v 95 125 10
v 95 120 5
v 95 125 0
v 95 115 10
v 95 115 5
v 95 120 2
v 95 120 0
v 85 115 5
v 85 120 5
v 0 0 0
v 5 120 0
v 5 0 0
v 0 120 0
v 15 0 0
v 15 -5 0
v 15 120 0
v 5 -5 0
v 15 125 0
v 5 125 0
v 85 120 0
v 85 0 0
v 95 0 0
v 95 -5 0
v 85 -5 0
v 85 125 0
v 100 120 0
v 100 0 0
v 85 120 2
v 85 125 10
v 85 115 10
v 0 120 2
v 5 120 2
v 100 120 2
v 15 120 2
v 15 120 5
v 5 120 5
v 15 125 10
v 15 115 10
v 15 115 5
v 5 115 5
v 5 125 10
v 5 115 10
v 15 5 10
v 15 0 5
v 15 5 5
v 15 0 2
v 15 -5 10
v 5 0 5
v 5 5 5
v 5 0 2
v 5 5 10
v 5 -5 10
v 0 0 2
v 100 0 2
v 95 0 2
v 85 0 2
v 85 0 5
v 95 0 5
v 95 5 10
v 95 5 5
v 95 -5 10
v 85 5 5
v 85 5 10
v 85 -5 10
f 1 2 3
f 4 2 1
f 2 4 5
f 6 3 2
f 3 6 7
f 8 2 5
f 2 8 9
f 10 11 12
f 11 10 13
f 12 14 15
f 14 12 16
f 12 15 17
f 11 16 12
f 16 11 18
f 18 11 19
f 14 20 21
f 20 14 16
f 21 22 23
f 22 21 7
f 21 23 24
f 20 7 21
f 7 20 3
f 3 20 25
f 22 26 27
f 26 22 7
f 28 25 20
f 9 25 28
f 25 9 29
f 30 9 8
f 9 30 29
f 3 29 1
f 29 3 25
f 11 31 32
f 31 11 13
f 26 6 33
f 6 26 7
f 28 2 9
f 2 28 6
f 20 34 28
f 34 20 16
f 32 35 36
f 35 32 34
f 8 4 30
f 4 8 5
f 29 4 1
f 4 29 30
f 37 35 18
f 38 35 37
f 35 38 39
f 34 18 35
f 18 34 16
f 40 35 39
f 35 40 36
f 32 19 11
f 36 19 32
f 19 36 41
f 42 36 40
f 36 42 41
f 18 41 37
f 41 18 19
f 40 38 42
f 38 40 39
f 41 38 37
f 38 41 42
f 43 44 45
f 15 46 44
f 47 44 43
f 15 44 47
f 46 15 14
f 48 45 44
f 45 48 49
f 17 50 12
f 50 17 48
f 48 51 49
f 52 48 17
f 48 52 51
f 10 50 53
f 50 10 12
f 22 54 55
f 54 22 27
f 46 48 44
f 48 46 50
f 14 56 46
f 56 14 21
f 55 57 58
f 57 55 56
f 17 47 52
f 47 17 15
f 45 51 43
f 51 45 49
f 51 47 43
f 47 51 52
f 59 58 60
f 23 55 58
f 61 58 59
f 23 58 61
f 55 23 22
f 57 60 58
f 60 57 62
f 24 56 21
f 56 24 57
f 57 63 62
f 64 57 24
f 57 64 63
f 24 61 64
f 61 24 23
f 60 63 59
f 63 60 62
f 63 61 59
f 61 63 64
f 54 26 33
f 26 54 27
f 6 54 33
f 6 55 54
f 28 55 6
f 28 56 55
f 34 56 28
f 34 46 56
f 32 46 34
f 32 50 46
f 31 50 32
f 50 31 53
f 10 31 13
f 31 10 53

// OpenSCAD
// file: ../math/vect.scad
function vect_scalar_sum(v, incr) = [for (i = [0: len(v) - 1]) v[i] + incr];

function vSize(size) = (!is_list(size)) ? [size, size, size]: size; 


function vect_2d_to_3d(vect, z = 0) = [vect[0], vect[1], z];

function vect_rotate2d(vect, b) = [
    cos(b) * vect[0] - sin(b) * vect[1],
    sin(b) * vect[0] + cos(b) * vect[1]
];

function round_vect(v) = [for (i = [0: len(v) - 1]) round(v[i])];
// file: ../math/align.scad
use <vect.scad>
module align_center(sizes, center = true, centerZ = false, vector=[1, 1, 0]){
    xxx=vector.x;
    yyy=vector.y;
    zzz=centerZ || vector.z;
    sizes = vSize(sizes);
    if (center){
        translate([xxx ? -sizes[0] / 2 : 0, yyy ? -sizes[1] / 2: 0, zzz ? -sizes[2]/2 : 0]){
            children();
        }
    } else {
        children();
    }   
}

module align_uncenter(sizes, uncenter = true, uncenterZ = false){
    sizes = vSize(sizes);
    if (uncenter){
        translate([sizes[0] / 2, sizes[1] / 2, (uncenterZ ? sizes[2]/2 : 0)]){
            children();
        }
    } else {
        children();
    }   
}

module align_relative(
    target_sizes, 
    source_sizes, 
    vector=[0,0,undef]
    ){
    function _aligner(t, s, v) = 
        v > 0 ? t * v:
        v < 0 ? s * v:
        (t - s) / 2;
    
    x = vector.x == undef ? 0 : _aligner(target_sizes.y, source_sizes.x, vector.x);
    y = vector.y == undef ? 0 : _aligner(target_sizes.y, source_sizes.y, vector.y);
    z = vector.z == undef ? 0 : _aligner(target_sizes.z, source_sizes.z, vector.z);
    translate([x, y, z])
        children();
}

module align_center_source_vs_target(target_sizes, source_sizes, centerZ = false){
    align_relative(target_sizes=target_sizes, source_sizes=source_sizes, vector=[0, 0, centerZ ? 1 : 0]);
    // align_uncenter(target_sizes, uncenterZ = centerZ)
    // union(){
    //     align_center(target_sizes, center = true, centerZ = centerZ)
    //         children(0);
    //     align_center(source_sizes, center = true, centerZ = centerZ)
    //         children(1);
    // }
}


module zz(z){
    translate([0, 0, z])
        children();
}

module xx(x){
    translate([x, 0, 0])
        children();
}

module yy(y){
    translate([0, y, 0])
        children();
}

module zc(){
    translate([0, 0, -0.01])
        children();
}
module xc(){
    translate([-0.01, 0, 0])    
        children();
}
module yc(){
    translate([0, -0.01, 0])
        children();
}

// align_center_source_vs_target([100, 100, 1], [10, 10, 10], centerZ = false){
//     cube([100,100,1]);
//     cube([10,10,10]);
// }

// align_center(20){
//     align_uncenter(20){
//         cube(20);
//     }
// }

target_sizes = [20, 20, 20];
source_sizes = [10, 10, 10];
color("azure",0.25)
    cube(size=target_sizes);
align_relative(target_sizes=target_sizes, source_sizes=source_sizes, vector=[0, 0, undef]){
    color("red",0.25)
        zz(20)
        cube(size=source_sizes);
}
// main file
use <../math/align.scad>


module _bar(barSize, barLedgeWidth, bottom=false){
    cube(barSize);
    ledgeSize = [barSize.x, barSize.y, barSize.y+ barLedgeWidth];
    zz(barSize.z){
        if (bottom){
            yy(barSize.y + barLedgeWidth)
            rotate([90,0,0])
                cube(ledgeSize);
        } else {
            yy(barSize.y)
            rotate([90,0,0])
                cube(ledgeSize);
        }
    }
    
}

module pcb_holder(pcbSize, barSize, barLedgeWidth, barMargin){

    right = pcbSize.x - barSize.x - barMargin.x;
    left = barMargin.x;
    top = pcbSize.y;
    bottom = -barSize.y;

    translate([right, top])
        _bar(barSize, barLedgeWidth);
    translate([left, top])
        _bar(barSize, barLedgeWidth);

    translate([left, bottom])
        _bar(barSize, barLedgeWidth, true);
    translate([right, bottom])
        _bar(barSize, barLedgeWidth, true);
}


pcbSize = [100, 120, 2];
barSize = [10, 5, 5];
barMargin = [5, 0.5];
barLedgeWidth=5;
color("green")
    cube(pcbSize);
pcb_holder(pcbSize=pcbSize, barSize=barSize, barLedgeWidth=barLedgeWidth,  barMargin=barMargin);
